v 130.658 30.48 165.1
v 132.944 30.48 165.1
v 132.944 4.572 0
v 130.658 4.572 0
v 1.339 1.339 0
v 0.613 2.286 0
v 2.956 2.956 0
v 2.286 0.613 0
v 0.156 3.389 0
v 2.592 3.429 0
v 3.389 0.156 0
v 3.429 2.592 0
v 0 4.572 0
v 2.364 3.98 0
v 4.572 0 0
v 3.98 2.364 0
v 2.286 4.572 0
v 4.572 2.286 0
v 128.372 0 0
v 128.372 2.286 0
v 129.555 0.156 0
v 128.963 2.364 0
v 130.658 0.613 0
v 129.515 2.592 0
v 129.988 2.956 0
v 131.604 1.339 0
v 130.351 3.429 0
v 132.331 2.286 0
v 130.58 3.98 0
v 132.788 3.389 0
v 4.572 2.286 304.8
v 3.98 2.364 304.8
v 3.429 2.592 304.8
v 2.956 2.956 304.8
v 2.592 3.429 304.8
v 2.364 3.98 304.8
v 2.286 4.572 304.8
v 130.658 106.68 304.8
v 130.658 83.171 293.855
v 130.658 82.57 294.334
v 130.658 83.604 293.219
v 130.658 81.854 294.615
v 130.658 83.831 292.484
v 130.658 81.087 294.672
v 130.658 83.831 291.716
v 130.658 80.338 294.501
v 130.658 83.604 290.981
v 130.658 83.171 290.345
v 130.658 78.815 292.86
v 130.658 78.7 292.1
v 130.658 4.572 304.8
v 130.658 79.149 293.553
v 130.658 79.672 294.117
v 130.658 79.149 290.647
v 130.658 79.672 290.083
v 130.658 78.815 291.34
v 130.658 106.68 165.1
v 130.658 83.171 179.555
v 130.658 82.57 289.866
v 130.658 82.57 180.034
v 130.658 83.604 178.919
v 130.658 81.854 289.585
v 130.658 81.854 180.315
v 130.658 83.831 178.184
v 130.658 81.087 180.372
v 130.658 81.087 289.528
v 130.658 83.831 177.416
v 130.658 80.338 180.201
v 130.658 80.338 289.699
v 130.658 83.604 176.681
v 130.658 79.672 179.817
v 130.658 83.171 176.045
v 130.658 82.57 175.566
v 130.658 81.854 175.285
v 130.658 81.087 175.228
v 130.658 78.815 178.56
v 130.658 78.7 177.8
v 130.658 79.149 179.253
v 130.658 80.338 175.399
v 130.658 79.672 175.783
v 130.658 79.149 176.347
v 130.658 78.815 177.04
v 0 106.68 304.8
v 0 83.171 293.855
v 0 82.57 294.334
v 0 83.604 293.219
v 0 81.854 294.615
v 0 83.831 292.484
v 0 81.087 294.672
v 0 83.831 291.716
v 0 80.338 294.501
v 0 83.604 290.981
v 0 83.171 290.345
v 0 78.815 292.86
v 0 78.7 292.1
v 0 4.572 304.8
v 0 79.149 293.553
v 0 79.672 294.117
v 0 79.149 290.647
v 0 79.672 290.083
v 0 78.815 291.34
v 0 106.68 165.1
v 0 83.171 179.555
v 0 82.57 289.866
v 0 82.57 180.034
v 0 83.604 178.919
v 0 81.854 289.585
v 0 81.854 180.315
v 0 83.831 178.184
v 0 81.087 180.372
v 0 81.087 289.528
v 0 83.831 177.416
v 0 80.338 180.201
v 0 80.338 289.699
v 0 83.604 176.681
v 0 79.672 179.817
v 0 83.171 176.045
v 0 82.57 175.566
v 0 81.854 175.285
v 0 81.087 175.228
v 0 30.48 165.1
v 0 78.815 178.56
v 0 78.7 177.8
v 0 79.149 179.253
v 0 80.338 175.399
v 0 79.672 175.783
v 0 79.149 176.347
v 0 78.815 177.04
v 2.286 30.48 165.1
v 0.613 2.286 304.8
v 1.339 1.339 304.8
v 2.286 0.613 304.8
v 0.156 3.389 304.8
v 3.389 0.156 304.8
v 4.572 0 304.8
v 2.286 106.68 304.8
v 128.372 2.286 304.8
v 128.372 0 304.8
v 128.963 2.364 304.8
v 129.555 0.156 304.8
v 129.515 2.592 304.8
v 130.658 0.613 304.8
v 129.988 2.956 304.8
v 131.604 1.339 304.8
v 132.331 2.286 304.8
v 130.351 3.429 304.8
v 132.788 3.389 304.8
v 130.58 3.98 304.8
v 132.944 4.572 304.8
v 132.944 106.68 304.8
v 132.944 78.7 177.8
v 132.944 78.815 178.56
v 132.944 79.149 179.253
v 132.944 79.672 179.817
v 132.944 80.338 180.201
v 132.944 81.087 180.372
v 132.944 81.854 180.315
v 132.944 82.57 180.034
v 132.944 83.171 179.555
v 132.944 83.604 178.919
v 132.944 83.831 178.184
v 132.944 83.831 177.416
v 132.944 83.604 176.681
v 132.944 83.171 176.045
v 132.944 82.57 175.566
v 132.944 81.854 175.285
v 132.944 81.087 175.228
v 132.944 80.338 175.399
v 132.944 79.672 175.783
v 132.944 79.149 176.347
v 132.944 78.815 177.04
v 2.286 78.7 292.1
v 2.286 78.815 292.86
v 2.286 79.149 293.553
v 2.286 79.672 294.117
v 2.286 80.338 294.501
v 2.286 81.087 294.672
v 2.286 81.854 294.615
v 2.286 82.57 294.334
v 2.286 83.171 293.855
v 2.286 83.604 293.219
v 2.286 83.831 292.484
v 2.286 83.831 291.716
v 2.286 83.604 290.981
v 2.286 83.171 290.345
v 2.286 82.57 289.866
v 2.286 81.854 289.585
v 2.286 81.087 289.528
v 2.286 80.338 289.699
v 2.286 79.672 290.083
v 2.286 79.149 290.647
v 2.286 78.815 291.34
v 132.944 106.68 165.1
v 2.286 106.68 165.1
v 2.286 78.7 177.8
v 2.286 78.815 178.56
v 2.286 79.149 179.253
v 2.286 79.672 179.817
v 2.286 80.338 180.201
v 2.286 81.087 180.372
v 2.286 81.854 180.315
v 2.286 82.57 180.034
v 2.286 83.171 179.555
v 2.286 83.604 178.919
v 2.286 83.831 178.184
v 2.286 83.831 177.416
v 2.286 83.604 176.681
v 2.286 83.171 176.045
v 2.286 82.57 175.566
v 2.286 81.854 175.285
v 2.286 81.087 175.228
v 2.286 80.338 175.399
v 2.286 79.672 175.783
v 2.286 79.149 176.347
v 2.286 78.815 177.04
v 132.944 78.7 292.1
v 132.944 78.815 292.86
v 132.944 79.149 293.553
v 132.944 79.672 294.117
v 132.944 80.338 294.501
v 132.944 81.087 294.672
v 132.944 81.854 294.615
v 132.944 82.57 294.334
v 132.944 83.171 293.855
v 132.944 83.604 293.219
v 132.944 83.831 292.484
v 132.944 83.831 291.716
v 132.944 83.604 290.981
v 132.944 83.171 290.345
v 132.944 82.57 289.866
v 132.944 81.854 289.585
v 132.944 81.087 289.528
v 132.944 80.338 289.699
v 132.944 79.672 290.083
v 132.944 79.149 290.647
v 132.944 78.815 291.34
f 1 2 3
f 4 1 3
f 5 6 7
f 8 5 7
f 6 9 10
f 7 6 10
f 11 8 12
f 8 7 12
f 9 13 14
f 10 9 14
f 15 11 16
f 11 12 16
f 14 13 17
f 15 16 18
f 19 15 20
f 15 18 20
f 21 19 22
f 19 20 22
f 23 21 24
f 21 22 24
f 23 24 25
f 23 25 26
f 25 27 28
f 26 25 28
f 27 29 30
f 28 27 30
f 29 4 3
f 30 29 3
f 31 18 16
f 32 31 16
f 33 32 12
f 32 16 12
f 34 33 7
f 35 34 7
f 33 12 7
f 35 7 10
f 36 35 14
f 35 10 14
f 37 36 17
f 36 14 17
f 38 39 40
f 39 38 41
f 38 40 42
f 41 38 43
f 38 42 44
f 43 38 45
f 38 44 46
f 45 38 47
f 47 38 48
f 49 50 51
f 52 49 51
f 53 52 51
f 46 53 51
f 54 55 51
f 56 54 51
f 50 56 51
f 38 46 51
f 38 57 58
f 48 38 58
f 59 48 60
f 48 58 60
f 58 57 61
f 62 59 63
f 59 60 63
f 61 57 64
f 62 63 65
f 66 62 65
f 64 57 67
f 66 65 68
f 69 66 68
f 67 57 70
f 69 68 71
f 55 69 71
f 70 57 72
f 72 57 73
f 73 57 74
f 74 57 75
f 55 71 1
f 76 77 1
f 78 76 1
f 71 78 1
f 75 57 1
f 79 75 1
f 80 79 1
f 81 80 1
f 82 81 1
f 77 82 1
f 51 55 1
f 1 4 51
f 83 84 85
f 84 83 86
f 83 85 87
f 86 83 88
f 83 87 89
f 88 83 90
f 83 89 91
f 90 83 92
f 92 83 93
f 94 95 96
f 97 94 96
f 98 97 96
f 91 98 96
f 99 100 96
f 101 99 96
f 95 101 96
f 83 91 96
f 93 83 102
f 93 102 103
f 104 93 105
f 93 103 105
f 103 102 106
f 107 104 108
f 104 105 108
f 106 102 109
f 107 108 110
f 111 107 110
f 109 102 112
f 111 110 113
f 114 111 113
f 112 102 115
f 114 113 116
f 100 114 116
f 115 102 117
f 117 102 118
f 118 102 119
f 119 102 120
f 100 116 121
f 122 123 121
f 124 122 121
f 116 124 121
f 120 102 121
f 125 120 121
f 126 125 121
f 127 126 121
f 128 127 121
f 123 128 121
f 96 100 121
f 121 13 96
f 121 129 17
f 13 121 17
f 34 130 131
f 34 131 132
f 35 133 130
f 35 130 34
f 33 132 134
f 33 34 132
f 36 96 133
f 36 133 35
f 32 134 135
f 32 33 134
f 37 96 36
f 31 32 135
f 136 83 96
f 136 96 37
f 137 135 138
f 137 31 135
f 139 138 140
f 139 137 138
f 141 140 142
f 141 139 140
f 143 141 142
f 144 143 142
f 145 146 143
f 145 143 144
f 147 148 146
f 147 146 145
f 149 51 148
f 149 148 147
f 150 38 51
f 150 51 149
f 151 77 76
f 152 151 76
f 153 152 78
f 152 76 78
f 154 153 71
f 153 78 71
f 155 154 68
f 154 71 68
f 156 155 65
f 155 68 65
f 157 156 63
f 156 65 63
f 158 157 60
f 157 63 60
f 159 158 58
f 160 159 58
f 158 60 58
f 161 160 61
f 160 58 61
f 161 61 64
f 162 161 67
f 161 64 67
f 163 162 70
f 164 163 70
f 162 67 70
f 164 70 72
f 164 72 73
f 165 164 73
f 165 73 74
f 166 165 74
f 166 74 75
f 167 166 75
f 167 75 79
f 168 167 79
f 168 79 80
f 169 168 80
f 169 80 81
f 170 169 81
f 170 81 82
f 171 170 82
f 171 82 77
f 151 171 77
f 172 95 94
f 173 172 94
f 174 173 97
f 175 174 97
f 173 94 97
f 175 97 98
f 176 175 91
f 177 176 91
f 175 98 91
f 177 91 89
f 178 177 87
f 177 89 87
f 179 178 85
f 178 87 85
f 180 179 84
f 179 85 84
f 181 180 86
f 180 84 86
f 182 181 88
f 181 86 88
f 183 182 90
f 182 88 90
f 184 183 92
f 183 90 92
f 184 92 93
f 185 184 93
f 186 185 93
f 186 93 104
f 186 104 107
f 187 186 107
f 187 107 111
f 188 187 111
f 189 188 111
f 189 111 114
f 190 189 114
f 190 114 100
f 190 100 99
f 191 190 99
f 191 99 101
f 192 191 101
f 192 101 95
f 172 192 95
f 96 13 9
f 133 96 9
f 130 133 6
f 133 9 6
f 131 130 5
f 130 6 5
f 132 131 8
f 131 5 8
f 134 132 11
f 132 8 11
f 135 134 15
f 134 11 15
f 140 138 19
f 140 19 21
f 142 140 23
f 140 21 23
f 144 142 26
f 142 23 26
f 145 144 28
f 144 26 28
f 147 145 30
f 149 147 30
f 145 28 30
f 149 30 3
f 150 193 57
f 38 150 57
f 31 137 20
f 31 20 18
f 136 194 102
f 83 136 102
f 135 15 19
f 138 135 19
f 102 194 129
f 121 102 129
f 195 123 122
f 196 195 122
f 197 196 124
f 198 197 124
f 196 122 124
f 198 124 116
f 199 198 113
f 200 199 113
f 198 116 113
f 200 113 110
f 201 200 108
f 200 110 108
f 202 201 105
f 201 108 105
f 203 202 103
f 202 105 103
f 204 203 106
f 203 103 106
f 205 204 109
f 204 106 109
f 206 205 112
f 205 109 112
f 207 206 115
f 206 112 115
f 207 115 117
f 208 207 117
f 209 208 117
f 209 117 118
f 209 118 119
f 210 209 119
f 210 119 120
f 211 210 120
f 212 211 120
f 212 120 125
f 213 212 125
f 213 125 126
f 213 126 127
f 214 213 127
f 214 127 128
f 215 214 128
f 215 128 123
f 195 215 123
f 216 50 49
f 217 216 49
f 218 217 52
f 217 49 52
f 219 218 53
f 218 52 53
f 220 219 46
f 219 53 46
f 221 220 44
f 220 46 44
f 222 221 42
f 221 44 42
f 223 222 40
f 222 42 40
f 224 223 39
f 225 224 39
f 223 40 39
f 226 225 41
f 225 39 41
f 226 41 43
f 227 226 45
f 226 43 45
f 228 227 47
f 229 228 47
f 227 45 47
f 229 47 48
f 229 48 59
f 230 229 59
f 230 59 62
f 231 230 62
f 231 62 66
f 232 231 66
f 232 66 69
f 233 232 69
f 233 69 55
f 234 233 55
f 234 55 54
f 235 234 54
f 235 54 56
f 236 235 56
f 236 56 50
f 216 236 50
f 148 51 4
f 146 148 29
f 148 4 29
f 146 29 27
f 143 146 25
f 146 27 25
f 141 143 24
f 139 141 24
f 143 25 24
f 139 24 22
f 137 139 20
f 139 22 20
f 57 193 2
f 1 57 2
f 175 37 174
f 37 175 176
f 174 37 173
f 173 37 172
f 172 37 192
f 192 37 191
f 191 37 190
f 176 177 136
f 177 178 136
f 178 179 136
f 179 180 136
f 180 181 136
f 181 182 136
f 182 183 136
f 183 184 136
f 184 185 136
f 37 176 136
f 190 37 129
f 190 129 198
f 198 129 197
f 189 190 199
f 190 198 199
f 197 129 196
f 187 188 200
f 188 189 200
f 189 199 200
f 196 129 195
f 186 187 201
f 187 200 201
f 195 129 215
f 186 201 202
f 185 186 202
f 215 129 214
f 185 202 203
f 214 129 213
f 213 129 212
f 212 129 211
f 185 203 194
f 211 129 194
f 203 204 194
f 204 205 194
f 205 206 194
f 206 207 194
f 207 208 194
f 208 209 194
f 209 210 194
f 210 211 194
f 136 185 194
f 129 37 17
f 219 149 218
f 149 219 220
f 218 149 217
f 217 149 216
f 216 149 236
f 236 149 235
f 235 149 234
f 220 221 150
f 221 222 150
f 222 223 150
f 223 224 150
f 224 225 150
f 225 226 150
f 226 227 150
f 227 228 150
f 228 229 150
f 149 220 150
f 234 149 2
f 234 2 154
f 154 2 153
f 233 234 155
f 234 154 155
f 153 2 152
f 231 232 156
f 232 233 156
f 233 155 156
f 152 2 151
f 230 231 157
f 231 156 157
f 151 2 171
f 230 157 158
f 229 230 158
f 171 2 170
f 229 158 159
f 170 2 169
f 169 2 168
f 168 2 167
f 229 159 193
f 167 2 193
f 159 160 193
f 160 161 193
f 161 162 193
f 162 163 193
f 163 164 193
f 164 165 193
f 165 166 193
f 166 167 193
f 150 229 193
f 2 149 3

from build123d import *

# Parameters (mm, degrees)
BASE_FLANGE1_DEPTH = 304.8
CUT_EXTRUDE3_DEPTH = 350.224373693
SKETCH9_R          = 2.5796875
CUT_EXTRUDE4_DEPTH = 350.224373693


# Sheet-metal steps are written as plain solids
with BuildPart() as part:
    # Sketch1 → Base-Flange1 (new body)
    with BuildSketch(Plane.XY):
        with BuildLine():
            Line((0, 106.68), (0, 4.572))
            ThreePointArc((0, 4.572), (1.339107796, 1.339107796), (4.572, 0))
            Line((4.572, 0), (128.3716, 0))
            ThreePointArc((128.3716, 0), (131.604492204, 1.339107796), (132.9436, 4.572))
            Line((132.9436, 4.572), (132.9436, 106.68))
            Line((132.9436, 106.68), (130.6576, 106.68))
            Line((130.6576, 106.68), (130.6576, 4.572))
            ThreePointArc((130.6576, 4.572), (129.988046102, 2.955553898), (128.3716, 2.286))
            Line((128.3716, 2.286), (4.572, 2.286))
            ThreePointArc((4.572, 2.286), (2.955553898, 2.955553898), (2.286, 4.572))
            Line((2.286, 4.572), (2.286, 106.68))
            Line((2.286, 106.68), (0, 106.68))
        make_face()
    extrude(amount=BASE_FLANGE1_DEPTH)

    # Sketch6 → Cut-Extrude3 (cut, through all)
    with BuildSketch(Plane(origin=(132.9436, 0, 0), x_dir=(0, 0, -1), z_dir=(1, 0, 0))):
        Polygon((0, 4.572), (0, 106.68), (-165.1, 106.68), (-165.1, 30.48), align=None)
    extrude(amount=-CUT_EXTRUDE3_DEPTH, mode=Mode.SUBTRACT)

    # Sketch9 → Cut-Extrude4 (cut, through all)
    with BuildSketch(Plane.ZY):
        with Locations(Location((177.8, 81.28, 0), (0, 0, 270))):
            Circle(SKETCH9_R)
        with Locations(Location((292.1, 81.28, 0), (0, 0, 270))):
            Circle(SKETCH9_R)
    extrude(amount=-CUT_EXTRUDE4_DEPTH, mode=Mode.SUBTRACT)


solid = part.part
